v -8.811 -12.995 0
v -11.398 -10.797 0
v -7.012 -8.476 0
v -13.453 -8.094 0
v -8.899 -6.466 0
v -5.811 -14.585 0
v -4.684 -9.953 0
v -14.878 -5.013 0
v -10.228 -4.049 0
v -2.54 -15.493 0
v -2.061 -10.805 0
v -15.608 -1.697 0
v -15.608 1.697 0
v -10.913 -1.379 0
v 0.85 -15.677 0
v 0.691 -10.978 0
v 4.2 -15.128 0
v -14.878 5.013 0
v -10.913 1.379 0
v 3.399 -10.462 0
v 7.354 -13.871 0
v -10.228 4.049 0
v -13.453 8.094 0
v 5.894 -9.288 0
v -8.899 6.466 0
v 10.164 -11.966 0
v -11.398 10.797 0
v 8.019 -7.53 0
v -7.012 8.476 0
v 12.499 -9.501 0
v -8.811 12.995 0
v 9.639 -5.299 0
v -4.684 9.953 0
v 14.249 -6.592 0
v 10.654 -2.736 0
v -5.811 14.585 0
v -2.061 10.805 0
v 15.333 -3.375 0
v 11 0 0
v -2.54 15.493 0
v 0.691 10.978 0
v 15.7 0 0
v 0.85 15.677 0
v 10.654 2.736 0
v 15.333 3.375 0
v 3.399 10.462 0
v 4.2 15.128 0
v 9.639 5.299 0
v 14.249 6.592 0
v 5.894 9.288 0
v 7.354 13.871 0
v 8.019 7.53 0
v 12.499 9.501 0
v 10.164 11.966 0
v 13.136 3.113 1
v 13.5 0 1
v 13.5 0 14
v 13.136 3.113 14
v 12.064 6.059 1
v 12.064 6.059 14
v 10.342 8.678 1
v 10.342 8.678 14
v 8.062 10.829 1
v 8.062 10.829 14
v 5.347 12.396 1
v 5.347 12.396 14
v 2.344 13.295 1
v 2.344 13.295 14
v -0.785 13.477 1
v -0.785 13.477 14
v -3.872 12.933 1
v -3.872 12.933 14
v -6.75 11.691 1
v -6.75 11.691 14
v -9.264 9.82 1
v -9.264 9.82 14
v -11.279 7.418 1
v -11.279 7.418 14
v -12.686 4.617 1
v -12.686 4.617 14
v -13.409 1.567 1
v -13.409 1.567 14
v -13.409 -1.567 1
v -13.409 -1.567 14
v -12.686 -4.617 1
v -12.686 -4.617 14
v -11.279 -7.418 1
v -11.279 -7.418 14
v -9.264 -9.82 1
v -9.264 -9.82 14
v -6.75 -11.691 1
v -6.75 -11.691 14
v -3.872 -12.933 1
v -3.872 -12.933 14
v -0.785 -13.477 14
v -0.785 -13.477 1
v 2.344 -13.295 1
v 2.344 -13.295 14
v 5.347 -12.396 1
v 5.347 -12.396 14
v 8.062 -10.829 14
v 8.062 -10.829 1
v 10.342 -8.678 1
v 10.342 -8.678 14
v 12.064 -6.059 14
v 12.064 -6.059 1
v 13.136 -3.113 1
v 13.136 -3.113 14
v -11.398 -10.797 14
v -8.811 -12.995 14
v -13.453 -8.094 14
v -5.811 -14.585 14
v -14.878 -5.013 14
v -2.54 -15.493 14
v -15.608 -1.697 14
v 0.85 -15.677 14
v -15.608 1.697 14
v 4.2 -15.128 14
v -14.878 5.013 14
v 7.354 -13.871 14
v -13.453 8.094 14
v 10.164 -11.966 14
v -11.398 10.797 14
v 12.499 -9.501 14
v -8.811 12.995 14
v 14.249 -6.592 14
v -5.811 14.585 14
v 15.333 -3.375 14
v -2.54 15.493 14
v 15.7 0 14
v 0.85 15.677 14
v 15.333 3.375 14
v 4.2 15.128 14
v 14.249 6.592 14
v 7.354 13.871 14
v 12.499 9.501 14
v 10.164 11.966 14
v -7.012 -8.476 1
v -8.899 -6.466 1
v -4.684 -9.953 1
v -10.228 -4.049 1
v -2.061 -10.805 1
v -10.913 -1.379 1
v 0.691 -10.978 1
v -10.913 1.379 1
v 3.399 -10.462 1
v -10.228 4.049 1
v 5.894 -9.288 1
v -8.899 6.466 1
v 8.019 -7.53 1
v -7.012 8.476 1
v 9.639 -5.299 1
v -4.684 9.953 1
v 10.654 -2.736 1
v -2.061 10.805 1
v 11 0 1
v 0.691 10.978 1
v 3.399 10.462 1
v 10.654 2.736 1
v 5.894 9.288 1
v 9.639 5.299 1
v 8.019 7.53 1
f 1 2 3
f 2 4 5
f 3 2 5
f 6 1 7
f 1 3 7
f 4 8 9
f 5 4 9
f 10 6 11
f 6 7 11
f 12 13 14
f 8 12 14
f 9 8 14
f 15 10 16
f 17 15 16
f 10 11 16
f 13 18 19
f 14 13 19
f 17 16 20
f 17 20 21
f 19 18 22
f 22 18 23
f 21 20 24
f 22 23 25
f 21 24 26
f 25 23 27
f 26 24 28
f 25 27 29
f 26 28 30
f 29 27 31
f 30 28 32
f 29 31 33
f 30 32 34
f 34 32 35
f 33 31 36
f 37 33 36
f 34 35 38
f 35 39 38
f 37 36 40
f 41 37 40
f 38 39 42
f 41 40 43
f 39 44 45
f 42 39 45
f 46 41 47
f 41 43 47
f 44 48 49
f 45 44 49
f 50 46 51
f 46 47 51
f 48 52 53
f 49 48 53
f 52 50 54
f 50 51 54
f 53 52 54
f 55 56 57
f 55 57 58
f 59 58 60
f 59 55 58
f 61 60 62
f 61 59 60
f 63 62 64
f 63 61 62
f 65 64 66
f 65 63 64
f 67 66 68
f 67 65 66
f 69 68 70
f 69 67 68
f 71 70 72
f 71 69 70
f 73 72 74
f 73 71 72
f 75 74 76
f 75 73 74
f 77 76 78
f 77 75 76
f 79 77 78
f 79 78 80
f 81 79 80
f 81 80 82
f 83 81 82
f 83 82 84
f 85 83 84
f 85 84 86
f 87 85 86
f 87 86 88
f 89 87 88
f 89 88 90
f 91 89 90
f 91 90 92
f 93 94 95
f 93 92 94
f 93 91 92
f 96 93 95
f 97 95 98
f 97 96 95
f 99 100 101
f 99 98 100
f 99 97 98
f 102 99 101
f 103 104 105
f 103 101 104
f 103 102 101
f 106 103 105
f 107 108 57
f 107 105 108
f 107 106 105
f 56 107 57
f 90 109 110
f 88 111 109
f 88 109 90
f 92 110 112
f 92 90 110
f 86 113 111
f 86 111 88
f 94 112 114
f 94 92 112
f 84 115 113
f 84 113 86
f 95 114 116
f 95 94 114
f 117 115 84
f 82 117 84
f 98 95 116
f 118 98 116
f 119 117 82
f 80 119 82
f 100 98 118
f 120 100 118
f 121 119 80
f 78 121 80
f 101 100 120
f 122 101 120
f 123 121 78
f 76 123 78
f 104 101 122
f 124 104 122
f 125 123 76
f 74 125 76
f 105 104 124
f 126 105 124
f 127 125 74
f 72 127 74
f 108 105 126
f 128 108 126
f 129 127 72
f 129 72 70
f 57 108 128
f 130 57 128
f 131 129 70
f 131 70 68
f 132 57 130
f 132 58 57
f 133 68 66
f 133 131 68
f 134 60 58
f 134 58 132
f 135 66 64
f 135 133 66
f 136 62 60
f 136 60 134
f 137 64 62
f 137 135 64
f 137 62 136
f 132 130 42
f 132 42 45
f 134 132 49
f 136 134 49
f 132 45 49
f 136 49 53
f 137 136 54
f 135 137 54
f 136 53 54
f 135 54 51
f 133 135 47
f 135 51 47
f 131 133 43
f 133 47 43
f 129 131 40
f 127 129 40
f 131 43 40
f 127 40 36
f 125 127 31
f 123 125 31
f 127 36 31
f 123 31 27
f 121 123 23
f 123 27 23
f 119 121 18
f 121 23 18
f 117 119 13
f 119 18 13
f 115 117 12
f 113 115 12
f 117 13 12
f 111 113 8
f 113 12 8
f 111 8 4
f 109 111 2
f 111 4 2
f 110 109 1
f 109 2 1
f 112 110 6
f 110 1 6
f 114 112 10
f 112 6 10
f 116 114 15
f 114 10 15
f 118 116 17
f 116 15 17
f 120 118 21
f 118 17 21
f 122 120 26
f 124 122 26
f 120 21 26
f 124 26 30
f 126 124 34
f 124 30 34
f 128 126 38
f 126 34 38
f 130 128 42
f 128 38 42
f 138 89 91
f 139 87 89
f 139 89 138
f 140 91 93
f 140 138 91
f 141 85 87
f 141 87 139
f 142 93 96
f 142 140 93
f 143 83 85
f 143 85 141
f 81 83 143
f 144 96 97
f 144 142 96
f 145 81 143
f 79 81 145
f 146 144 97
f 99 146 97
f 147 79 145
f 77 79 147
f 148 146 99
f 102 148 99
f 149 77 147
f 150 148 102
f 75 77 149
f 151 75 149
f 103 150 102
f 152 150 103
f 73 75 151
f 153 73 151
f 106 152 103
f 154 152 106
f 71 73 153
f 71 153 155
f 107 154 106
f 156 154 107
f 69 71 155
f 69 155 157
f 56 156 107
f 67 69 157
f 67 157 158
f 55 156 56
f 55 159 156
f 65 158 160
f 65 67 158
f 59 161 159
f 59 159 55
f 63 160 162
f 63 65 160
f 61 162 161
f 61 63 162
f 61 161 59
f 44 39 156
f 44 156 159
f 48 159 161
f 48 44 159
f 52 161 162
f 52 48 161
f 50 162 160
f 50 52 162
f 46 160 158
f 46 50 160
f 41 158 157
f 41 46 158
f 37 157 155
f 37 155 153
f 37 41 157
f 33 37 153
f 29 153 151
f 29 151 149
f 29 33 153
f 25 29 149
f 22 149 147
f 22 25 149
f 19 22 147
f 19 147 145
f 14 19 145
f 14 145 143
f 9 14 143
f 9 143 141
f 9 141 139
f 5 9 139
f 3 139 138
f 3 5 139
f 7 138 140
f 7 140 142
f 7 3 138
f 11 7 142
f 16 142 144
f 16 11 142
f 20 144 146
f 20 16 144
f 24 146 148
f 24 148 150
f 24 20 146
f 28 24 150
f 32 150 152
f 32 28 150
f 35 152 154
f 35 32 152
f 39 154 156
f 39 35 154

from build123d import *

# Parameters (mm, degrees)
CYLINDER081_R     = 13.5
CYLINDER081_DEPTH = 20
CYLINDER080_R     = 15.7
CYLINDER080_DEPTH = 14
CYLINDER083_R     = 11
CYLINDER083_DEPTH = 1
CYLINDER082_R     = 15
CYLINDER082_DEPTH = 1


with BuildPart() as internal_border:
    # Cylinder081 → Cylinder081 (new body)
    with BuildSketch(Plane.XY):
        Circle(CYLINDER081_R)
    extrude(amount=CYLINDER081_DEPTH)


with BuildPart() as adapter_tube_cut:
    # Cylinder080 → Cylinder080 (new body)
    with BuildSketch(Plane.XY):
        Circle(CYLINDER080_R)
    extrude(amount=CYLINDER080_DEPTH)

    # Cut023016: cut internal border
    add(internal_border.part, mode=Mode.SUBTRACT)


with BuildPart() as top_plate_hole:
    # Cylinder083 → Cylinder083 (new body)
    with BuildSketch(Plane.XY):
        Circle(CYLINDER083_R)
    extrude(amount=CYLINDER083_DEPTH)


with BuildPart() as eyepiece_adapter_fusion:
    # Cylinder082 → Cylinder082 (new body)
    with BuildSketch(Plane.XY):
        Circle(CYLINDER082_R)
    extrude(amount=CYLINDER082_DEPTH)

    # Cut023015: cut top plate hole
    add(top_plate_hole.part, mode=Mode.SUBTRACT)

    # Fusion057: union adapter tube cut
    add(adapter_tube_cut.part)


solid = eyepiece_adapter_fusion.part
